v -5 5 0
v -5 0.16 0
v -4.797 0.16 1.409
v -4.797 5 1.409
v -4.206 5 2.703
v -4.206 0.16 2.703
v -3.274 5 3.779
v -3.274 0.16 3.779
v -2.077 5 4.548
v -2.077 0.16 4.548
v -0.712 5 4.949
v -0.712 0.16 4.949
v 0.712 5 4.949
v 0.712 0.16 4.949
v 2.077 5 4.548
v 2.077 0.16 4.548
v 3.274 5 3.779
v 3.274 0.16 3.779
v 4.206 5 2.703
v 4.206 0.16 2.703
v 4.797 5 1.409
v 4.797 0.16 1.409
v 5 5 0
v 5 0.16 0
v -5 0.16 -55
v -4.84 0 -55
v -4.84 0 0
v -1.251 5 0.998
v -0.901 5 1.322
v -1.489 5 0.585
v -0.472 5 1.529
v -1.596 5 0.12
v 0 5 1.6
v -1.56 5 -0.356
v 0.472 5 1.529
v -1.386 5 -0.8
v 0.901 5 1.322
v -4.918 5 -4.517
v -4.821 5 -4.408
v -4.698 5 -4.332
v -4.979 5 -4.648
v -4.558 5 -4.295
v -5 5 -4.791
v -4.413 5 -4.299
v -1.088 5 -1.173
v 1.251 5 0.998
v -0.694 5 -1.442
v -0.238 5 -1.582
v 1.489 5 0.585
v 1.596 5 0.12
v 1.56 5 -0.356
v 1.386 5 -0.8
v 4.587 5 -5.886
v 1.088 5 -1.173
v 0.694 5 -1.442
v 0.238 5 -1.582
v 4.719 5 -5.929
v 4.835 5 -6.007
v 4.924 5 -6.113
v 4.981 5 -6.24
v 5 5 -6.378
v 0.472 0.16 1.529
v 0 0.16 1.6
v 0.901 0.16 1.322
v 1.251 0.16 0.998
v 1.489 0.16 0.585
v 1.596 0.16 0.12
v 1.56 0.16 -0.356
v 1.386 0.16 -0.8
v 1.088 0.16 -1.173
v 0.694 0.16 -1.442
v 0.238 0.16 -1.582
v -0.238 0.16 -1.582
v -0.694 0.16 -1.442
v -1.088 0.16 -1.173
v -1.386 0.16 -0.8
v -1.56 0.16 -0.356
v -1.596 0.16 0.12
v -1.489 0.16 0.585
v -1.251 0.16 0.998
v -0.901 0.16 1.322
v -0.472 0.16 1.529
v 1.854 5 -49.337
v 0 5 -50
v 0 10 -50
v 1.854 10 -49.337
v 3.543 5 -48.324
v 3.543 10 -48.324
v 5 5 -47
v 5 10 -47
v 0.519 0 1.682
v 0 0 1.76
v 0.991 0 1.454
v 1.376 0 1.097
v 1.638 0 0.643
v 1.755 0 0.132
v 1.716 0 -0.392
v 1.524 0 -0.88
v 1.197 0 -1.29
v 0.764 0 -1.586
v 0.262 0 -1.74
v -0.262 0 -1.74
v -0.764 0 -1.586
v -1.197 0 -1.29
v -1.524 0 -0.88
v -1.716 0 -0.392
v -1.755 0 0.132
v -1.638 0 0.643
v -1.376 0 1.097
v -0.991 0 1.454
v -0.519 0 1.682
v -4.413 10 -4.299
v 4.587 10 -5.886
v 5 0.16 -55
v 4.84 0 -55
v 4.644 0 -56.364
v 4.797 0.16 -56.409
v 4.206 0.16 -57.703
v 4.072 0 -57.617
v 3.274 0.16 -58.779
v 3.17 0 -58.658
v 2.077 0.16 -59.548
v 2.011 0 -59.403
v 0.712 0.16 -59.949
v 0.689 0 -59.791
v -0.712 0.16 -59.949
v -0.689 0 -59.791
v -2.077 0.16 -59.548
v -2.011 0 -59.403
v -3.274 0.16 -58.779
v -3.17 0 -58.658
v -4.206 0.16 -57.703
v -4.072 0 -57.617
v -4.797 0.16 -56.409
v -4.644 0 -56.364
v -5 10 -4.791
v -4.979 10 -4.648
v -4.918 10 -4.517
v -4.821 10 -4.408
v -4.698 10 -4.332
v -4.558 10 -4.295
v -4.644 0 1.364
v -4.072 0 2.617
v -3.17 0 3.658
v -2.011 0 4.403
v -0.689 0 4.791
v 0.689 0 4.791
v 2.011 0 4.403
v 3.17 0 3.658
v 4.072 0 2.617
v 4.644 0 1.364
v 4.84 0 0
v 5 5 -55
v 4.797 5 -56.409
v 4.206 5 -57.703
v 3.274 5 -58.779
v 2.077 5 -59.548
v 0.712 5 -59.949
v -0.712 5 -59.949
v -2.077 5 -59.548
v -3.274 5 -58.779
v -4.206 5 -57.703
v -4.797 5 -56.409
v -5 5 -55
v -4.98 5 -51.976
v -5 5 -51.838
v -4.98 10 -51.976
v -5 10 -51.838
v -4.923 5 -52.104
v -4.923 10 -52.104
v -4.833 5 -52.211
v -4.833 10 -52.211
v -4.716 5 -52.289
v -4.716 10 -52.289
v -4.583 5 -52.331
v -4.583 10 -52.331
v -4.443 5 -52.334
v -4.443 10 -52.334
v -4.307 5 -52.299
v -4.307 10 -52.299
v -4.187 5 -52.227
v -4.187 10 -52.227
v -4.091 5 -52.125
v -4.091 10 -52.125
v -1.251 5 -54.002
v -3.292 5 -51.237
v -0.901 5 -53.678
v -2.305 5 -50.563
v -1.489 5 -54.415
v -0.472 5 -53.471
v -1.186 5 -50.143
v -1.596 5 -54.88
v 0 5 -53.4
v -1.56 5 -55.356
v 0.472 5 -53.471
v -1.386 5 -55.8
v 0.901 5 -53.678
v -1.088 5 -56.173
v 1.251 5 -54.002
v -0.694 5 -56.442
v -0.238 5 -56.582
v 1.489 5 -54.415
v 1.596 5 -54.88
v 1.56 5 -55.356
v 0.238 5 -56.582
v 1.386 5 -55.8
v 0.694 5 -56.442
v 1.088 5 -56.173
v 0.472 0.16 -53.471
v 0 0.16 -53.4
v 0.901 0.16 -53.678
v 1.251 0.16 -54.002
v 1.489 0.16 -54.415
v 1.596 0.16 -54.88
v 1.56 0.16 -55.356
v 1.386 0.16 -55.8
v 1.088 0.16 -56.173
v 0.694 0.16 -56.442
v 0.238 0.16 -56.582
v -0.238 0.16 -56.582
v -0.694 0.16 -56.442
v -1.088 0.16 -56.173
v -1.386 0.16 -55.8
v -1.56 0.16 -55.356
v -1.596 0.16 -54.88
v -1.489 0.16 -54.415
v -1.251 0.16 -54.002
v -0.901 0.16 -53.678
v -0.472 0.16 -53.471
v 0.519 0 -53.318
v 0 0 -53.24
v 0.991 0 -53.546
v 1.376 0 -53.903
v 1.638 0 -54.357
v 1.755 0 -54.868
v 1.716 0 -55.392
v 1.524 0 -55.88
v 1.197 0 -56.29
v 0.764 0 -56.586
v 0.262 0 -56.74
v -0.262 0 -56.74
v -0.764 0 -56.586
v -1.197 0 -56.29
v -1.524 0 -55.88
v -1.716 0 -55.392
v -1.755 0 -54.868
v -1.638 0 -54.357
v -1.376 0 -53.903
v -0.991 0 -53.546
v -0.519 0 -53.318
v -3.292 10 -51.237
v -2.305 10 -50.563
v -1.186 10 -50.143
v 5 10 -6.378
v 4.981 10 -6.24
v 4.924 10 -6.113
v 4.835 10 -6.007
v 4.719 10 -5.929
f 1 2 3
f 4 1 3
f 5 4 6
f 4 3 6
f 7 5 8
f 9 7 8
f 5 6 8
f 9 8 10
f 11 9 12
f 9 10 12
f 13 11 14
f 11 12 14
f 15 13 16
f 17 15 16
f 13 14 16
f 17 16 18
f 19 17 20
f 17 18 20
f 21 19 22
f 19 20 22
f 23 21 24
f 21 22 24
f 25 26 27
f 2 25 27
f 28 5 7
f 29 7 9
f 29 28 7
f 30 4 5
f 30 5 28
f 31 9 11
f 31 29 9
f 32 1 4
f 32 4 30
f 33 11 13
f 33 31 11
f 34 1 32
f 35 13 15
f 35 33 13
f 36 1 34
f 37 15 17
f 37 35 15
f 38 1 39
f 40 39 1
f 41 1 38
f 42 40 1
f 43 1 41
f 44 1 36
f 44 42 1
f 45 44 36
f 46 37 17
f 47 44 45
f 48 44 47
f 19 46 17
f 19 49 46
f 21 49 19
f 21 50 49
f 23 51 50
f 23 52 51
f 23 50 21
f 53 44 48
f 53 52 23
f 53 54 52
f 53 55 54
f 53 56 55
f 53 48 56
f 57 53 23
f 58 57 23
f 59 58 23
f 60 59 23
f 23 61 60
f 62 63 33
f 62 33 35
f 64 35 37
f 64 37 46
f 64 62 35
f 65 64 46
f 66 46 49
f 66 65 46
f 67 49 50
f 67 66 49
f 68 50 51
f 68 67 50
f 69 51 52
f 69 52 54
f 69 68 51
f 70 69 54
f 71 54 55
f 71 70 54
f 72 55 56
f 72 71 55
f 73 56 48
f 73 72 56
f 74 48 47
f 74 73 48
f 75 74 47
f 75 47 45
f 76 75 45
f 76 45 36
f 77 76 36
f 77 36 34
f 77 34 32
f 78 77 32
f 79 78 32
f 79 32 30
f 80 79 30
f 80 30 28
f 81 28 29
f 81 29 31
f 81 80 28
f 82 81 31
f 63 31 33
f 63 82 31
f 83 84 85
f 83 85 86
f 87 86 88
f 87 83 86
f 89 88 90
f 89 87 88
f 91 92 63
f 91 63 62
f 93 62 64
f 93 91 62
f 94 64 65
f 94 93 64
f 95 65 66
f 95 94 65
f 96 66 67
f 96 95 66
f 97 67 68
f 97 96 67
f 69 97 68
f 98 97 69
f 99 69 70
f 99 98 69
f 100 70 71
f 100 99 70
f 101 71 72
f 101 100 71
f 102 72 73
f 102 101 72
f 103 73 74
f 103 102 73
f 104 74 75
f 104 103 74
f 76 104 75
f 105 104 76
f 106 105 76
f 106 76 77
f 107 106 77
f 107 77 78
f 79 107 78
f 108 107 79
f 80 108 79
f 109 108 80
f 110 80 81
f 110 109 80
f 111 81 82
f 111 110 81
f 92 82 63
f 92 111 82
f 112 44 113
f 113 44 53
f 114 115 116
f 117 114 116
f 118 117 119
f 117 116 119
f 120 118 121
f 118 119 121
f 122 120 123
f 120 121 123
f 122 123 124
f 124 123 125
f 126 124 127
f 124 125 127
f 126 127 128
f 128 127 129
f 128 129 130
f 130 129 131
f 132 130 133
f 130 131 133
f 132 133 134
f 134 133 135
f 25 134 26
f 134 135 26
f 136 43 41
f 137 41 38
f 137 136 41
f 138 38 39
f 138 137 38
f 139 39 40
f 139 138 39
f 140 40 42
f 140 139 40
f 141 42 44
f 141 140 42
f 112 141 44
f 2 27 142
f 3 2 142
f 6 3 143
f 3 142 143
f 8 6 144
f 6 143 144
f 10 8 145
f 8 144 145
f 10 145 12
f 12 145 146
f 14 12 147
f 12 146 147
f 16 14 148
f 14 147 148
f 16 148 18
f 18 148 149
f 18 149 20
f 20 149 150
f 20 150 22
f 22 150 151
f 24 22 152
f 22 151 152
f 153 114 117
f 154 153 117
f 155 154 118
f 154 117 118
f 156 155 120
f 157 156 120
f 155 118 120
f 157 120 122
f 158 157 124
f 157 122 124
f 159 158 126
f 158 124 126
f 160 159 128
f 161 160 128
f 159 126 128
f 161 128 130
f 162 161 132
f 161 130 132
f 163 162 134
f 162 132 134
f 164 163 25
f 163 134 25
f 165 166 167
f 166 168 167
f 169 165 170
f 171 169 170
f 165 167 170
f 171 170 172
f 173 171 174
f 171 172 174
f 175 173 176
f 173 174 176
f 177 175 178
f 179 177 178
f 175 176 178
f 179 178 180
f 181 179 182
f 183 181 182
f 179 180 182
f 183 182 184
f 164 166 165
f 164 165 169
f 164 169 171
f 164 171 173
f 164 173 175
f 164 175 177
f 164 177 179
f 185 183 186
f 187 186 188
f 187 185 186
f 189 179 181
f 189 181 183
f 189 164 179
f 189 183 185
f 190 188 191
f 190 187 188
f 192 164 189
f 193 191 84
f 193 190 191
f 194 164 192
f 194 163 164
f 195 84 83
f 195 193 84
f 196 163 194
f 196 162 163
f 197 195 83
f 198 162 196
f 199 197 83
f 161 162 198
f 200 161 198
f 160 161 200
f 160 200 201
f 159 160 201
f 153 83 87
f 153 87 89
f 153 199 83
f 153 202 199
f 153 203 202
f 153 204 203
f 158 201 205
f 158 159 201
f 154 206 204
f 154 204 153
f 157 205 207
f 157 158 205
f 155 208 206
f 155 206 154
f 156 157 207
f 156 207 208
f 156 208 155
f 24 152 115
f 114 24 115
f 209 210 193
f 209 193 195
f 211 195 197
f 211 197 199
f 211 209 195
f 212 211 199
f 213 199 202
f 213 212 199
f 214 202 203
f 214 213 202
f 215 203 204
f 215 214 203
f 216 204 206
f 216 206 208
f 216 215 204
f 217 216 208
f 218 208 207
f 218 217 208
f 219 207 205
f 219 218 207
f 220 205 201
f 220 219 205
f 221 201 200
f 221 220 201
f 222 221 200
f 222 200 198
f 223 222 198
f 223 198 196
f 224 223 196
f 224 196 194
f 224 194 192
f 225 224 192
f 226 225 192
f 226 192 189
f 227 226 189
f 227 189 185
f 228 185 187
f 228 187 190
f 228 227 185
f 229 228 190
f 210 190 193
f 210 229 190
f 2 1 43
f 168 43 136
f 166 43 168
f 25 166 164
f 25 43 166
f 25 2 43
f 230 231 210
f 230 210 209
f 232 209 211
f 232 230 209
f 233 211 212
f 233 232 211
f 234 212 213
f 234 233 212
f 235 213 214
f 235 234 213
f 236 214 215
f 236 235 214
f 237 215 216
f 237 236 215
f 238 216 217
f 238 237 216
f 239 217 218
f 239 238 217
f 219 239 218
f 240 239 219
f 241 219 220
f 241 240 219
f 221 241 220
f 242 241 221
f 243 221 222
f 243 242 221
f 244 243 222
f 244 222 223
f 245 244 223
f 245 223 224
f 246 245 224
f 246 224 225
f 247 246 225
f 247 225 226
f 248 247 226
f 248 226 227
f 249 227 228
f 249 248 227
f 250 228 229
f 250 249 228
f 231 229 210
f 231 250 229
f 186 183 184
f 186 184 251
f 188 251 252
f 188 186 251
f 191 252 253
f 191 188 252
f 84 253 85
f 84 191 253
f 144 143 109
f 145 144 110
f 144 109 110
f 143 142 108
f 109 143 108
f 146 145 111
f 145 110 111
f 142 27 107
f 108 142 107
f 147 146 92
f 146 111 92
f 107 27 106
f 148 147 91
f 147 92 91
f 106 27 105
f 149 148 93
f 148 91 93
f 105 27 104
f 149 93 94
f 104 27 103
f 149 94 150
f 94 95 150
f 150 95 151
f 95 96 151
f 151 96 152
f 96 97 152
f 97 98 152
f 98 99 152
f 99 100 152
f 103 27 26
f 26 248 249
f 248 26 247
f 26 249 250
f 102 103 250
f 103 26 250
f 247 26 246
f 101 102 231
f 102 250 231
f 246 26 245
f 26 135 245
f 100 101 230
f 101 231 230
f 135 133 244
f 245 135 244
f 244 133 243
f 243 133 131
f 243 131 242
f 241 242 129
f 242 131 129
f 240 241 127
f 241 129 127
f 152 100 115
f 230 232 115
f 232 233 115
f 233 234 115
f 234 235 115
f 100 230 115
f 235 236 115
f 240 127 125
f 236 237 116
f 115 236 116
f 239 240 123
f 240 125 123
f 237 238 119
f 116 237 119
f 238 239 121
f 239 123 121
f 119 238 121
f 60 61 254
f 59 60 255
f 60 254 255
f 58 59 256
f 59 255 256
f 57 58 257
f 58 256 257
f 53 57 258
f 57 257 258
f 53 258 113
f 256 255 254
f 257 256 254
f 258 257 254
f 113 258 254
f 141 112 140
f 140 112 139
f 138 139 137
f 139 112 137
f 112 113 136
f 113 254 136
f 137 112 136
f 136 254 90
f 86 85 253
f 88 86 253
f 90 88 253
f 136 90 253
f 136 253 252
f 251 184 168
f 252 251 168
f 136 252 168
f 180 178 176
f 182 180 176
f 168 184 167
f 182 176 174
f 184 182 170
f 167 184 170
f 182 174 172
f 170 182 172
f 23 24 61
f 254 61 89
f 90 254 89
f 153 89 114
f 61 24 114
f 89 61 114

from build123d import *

# Parameters (mm, degrees)
CENTER_BODY_DEPTH               = 10
SKETCH1_3_R                     = 1.6
SKETCH1_3_R_2                   = 1.6000000000000003
CONNECTOR_BODY_DEPTH            = 5
MECH_LOCK_RIGHT_DEPTH           = 5
DULLING_FILLET_GENERAL_R        = 0.5
ELEPHANTSFOOT_COMPENSATION_SIZE = 0.16
DULLING_FILLET_RIGHT_R          = 0.5


with BuildPart() as part:
    # complete_sketch → center_body (new body)
    with BuildSketch(Plane(origin=(0, 0, 0), x_dir=(1, 0, 0), z_dir=(0, 1, 0))):
        Polygon((-5, 47), (-5, 4.195498155886381), (5, 5.958767962971076), (5, 47), align=None)
    extrude(amount=CENTER_BODY_DEPTH)

    # Sketch1<3> → connector_body (add)
    # profile 1 of 2: a face of its own
    with BuildSketch(Plane(origin=(0, 0, 0), x_dir=(1, 0, 0), z_dir=(0, 1, 0))):
        with BuildLine():
            Line((-5, 4.195498155886381), (-5, 0))
            ThreePointArc((-5, 0), (-3.1e-16, -5), (5, -6.1e-16))
            Line((5, 0), (5, 5.958767962971076))
            Line((5, 5.958767962971076), (-5, 4.195498155886381))
        make_face()
        Circle(SKETCH1_3_R, mode=Mode.SUBTRACT)
    # profile 2 of 2: a face of its own
    with BuildSketch(Plane(origin=(0, 0, 0), x_dir=(1, 0, 0), z_dir=(0, 1, 0))):
        with BuildLine():
            Line((-5, 55), (-5, 47))
            Line((-5, 47), (5, 47))
            Line((5.000000000000001, 47), (5, 55))
            ThreePointArc((5, 55), (-1.4e-16, 60), (-5, 55))
        make_face()
        with Locations((0, 55)):
            Circle(SKETCH1_3_R_2, mode=Mode.SUBTRACT)
    extrude(amount=CONNECTOR_BODY_DEPTH)

    # Sketch2 → mech_lock_right (add)
    with BuildSketch(Plane(origin=(0, 5, 0), x_dir=(1, 0, 0), z_dir=(0, 1, 0))):
        with BuildLine():
            Line((5, 47), (-5, 47))
            Line((-5, 47), (-5, 55))
            ThreePointArc((-5, 55), (-3.5355339059327315, 51.46446609406727), (0, 50))
            ThreePointArc((0, 50), (2.7235158716690253, 48.87252645278171), (5, 47))
        make_face()
    extrude(amount=MECH_LOCK_RIGHT_DEPTH)

    # dulling_fillet_general
    dulling_fillet_general_edges = [part.edges().sort_by_distance(p)[0] for p in [
        (5, 7.5, -5.958767962971076),
        (-5, 7.5, -4.195498155886381),
    ]]
    fillet(dulling_fillet_general_edges, radius=DULLING_FILLET_GENERAL_R)

    # elephantsfoot_compensation
    elephantsfoot_compensation_edges = [part.edges().sort_by_distance(p)[0] for p in [
        (-1.6000000000000003, 0, -55),
        (-1.6, 0, -2e-16),
        (1.4e-16, 0, 5),
        (-1.4e-16, 0, -60),
        (5, 0, -27.5),
        (-5, 0, -27.5),
    ]]
    chamfer(elephantsfoot_compensation_edges, length=ELEPHANTSFOOT_COMPENSATION_SIZE)

    # dulling_fillet_right
    dulling_fillet_right_edges = [part.edges().sort_by_distance(p)[0] for p in [
        (-4.999999999999998, 7.5, -55),
    ]]
    fillet(dulling_fillet_right_edges, radius=DULLING_FILLET_RIGHT_R)


solid = part.part
